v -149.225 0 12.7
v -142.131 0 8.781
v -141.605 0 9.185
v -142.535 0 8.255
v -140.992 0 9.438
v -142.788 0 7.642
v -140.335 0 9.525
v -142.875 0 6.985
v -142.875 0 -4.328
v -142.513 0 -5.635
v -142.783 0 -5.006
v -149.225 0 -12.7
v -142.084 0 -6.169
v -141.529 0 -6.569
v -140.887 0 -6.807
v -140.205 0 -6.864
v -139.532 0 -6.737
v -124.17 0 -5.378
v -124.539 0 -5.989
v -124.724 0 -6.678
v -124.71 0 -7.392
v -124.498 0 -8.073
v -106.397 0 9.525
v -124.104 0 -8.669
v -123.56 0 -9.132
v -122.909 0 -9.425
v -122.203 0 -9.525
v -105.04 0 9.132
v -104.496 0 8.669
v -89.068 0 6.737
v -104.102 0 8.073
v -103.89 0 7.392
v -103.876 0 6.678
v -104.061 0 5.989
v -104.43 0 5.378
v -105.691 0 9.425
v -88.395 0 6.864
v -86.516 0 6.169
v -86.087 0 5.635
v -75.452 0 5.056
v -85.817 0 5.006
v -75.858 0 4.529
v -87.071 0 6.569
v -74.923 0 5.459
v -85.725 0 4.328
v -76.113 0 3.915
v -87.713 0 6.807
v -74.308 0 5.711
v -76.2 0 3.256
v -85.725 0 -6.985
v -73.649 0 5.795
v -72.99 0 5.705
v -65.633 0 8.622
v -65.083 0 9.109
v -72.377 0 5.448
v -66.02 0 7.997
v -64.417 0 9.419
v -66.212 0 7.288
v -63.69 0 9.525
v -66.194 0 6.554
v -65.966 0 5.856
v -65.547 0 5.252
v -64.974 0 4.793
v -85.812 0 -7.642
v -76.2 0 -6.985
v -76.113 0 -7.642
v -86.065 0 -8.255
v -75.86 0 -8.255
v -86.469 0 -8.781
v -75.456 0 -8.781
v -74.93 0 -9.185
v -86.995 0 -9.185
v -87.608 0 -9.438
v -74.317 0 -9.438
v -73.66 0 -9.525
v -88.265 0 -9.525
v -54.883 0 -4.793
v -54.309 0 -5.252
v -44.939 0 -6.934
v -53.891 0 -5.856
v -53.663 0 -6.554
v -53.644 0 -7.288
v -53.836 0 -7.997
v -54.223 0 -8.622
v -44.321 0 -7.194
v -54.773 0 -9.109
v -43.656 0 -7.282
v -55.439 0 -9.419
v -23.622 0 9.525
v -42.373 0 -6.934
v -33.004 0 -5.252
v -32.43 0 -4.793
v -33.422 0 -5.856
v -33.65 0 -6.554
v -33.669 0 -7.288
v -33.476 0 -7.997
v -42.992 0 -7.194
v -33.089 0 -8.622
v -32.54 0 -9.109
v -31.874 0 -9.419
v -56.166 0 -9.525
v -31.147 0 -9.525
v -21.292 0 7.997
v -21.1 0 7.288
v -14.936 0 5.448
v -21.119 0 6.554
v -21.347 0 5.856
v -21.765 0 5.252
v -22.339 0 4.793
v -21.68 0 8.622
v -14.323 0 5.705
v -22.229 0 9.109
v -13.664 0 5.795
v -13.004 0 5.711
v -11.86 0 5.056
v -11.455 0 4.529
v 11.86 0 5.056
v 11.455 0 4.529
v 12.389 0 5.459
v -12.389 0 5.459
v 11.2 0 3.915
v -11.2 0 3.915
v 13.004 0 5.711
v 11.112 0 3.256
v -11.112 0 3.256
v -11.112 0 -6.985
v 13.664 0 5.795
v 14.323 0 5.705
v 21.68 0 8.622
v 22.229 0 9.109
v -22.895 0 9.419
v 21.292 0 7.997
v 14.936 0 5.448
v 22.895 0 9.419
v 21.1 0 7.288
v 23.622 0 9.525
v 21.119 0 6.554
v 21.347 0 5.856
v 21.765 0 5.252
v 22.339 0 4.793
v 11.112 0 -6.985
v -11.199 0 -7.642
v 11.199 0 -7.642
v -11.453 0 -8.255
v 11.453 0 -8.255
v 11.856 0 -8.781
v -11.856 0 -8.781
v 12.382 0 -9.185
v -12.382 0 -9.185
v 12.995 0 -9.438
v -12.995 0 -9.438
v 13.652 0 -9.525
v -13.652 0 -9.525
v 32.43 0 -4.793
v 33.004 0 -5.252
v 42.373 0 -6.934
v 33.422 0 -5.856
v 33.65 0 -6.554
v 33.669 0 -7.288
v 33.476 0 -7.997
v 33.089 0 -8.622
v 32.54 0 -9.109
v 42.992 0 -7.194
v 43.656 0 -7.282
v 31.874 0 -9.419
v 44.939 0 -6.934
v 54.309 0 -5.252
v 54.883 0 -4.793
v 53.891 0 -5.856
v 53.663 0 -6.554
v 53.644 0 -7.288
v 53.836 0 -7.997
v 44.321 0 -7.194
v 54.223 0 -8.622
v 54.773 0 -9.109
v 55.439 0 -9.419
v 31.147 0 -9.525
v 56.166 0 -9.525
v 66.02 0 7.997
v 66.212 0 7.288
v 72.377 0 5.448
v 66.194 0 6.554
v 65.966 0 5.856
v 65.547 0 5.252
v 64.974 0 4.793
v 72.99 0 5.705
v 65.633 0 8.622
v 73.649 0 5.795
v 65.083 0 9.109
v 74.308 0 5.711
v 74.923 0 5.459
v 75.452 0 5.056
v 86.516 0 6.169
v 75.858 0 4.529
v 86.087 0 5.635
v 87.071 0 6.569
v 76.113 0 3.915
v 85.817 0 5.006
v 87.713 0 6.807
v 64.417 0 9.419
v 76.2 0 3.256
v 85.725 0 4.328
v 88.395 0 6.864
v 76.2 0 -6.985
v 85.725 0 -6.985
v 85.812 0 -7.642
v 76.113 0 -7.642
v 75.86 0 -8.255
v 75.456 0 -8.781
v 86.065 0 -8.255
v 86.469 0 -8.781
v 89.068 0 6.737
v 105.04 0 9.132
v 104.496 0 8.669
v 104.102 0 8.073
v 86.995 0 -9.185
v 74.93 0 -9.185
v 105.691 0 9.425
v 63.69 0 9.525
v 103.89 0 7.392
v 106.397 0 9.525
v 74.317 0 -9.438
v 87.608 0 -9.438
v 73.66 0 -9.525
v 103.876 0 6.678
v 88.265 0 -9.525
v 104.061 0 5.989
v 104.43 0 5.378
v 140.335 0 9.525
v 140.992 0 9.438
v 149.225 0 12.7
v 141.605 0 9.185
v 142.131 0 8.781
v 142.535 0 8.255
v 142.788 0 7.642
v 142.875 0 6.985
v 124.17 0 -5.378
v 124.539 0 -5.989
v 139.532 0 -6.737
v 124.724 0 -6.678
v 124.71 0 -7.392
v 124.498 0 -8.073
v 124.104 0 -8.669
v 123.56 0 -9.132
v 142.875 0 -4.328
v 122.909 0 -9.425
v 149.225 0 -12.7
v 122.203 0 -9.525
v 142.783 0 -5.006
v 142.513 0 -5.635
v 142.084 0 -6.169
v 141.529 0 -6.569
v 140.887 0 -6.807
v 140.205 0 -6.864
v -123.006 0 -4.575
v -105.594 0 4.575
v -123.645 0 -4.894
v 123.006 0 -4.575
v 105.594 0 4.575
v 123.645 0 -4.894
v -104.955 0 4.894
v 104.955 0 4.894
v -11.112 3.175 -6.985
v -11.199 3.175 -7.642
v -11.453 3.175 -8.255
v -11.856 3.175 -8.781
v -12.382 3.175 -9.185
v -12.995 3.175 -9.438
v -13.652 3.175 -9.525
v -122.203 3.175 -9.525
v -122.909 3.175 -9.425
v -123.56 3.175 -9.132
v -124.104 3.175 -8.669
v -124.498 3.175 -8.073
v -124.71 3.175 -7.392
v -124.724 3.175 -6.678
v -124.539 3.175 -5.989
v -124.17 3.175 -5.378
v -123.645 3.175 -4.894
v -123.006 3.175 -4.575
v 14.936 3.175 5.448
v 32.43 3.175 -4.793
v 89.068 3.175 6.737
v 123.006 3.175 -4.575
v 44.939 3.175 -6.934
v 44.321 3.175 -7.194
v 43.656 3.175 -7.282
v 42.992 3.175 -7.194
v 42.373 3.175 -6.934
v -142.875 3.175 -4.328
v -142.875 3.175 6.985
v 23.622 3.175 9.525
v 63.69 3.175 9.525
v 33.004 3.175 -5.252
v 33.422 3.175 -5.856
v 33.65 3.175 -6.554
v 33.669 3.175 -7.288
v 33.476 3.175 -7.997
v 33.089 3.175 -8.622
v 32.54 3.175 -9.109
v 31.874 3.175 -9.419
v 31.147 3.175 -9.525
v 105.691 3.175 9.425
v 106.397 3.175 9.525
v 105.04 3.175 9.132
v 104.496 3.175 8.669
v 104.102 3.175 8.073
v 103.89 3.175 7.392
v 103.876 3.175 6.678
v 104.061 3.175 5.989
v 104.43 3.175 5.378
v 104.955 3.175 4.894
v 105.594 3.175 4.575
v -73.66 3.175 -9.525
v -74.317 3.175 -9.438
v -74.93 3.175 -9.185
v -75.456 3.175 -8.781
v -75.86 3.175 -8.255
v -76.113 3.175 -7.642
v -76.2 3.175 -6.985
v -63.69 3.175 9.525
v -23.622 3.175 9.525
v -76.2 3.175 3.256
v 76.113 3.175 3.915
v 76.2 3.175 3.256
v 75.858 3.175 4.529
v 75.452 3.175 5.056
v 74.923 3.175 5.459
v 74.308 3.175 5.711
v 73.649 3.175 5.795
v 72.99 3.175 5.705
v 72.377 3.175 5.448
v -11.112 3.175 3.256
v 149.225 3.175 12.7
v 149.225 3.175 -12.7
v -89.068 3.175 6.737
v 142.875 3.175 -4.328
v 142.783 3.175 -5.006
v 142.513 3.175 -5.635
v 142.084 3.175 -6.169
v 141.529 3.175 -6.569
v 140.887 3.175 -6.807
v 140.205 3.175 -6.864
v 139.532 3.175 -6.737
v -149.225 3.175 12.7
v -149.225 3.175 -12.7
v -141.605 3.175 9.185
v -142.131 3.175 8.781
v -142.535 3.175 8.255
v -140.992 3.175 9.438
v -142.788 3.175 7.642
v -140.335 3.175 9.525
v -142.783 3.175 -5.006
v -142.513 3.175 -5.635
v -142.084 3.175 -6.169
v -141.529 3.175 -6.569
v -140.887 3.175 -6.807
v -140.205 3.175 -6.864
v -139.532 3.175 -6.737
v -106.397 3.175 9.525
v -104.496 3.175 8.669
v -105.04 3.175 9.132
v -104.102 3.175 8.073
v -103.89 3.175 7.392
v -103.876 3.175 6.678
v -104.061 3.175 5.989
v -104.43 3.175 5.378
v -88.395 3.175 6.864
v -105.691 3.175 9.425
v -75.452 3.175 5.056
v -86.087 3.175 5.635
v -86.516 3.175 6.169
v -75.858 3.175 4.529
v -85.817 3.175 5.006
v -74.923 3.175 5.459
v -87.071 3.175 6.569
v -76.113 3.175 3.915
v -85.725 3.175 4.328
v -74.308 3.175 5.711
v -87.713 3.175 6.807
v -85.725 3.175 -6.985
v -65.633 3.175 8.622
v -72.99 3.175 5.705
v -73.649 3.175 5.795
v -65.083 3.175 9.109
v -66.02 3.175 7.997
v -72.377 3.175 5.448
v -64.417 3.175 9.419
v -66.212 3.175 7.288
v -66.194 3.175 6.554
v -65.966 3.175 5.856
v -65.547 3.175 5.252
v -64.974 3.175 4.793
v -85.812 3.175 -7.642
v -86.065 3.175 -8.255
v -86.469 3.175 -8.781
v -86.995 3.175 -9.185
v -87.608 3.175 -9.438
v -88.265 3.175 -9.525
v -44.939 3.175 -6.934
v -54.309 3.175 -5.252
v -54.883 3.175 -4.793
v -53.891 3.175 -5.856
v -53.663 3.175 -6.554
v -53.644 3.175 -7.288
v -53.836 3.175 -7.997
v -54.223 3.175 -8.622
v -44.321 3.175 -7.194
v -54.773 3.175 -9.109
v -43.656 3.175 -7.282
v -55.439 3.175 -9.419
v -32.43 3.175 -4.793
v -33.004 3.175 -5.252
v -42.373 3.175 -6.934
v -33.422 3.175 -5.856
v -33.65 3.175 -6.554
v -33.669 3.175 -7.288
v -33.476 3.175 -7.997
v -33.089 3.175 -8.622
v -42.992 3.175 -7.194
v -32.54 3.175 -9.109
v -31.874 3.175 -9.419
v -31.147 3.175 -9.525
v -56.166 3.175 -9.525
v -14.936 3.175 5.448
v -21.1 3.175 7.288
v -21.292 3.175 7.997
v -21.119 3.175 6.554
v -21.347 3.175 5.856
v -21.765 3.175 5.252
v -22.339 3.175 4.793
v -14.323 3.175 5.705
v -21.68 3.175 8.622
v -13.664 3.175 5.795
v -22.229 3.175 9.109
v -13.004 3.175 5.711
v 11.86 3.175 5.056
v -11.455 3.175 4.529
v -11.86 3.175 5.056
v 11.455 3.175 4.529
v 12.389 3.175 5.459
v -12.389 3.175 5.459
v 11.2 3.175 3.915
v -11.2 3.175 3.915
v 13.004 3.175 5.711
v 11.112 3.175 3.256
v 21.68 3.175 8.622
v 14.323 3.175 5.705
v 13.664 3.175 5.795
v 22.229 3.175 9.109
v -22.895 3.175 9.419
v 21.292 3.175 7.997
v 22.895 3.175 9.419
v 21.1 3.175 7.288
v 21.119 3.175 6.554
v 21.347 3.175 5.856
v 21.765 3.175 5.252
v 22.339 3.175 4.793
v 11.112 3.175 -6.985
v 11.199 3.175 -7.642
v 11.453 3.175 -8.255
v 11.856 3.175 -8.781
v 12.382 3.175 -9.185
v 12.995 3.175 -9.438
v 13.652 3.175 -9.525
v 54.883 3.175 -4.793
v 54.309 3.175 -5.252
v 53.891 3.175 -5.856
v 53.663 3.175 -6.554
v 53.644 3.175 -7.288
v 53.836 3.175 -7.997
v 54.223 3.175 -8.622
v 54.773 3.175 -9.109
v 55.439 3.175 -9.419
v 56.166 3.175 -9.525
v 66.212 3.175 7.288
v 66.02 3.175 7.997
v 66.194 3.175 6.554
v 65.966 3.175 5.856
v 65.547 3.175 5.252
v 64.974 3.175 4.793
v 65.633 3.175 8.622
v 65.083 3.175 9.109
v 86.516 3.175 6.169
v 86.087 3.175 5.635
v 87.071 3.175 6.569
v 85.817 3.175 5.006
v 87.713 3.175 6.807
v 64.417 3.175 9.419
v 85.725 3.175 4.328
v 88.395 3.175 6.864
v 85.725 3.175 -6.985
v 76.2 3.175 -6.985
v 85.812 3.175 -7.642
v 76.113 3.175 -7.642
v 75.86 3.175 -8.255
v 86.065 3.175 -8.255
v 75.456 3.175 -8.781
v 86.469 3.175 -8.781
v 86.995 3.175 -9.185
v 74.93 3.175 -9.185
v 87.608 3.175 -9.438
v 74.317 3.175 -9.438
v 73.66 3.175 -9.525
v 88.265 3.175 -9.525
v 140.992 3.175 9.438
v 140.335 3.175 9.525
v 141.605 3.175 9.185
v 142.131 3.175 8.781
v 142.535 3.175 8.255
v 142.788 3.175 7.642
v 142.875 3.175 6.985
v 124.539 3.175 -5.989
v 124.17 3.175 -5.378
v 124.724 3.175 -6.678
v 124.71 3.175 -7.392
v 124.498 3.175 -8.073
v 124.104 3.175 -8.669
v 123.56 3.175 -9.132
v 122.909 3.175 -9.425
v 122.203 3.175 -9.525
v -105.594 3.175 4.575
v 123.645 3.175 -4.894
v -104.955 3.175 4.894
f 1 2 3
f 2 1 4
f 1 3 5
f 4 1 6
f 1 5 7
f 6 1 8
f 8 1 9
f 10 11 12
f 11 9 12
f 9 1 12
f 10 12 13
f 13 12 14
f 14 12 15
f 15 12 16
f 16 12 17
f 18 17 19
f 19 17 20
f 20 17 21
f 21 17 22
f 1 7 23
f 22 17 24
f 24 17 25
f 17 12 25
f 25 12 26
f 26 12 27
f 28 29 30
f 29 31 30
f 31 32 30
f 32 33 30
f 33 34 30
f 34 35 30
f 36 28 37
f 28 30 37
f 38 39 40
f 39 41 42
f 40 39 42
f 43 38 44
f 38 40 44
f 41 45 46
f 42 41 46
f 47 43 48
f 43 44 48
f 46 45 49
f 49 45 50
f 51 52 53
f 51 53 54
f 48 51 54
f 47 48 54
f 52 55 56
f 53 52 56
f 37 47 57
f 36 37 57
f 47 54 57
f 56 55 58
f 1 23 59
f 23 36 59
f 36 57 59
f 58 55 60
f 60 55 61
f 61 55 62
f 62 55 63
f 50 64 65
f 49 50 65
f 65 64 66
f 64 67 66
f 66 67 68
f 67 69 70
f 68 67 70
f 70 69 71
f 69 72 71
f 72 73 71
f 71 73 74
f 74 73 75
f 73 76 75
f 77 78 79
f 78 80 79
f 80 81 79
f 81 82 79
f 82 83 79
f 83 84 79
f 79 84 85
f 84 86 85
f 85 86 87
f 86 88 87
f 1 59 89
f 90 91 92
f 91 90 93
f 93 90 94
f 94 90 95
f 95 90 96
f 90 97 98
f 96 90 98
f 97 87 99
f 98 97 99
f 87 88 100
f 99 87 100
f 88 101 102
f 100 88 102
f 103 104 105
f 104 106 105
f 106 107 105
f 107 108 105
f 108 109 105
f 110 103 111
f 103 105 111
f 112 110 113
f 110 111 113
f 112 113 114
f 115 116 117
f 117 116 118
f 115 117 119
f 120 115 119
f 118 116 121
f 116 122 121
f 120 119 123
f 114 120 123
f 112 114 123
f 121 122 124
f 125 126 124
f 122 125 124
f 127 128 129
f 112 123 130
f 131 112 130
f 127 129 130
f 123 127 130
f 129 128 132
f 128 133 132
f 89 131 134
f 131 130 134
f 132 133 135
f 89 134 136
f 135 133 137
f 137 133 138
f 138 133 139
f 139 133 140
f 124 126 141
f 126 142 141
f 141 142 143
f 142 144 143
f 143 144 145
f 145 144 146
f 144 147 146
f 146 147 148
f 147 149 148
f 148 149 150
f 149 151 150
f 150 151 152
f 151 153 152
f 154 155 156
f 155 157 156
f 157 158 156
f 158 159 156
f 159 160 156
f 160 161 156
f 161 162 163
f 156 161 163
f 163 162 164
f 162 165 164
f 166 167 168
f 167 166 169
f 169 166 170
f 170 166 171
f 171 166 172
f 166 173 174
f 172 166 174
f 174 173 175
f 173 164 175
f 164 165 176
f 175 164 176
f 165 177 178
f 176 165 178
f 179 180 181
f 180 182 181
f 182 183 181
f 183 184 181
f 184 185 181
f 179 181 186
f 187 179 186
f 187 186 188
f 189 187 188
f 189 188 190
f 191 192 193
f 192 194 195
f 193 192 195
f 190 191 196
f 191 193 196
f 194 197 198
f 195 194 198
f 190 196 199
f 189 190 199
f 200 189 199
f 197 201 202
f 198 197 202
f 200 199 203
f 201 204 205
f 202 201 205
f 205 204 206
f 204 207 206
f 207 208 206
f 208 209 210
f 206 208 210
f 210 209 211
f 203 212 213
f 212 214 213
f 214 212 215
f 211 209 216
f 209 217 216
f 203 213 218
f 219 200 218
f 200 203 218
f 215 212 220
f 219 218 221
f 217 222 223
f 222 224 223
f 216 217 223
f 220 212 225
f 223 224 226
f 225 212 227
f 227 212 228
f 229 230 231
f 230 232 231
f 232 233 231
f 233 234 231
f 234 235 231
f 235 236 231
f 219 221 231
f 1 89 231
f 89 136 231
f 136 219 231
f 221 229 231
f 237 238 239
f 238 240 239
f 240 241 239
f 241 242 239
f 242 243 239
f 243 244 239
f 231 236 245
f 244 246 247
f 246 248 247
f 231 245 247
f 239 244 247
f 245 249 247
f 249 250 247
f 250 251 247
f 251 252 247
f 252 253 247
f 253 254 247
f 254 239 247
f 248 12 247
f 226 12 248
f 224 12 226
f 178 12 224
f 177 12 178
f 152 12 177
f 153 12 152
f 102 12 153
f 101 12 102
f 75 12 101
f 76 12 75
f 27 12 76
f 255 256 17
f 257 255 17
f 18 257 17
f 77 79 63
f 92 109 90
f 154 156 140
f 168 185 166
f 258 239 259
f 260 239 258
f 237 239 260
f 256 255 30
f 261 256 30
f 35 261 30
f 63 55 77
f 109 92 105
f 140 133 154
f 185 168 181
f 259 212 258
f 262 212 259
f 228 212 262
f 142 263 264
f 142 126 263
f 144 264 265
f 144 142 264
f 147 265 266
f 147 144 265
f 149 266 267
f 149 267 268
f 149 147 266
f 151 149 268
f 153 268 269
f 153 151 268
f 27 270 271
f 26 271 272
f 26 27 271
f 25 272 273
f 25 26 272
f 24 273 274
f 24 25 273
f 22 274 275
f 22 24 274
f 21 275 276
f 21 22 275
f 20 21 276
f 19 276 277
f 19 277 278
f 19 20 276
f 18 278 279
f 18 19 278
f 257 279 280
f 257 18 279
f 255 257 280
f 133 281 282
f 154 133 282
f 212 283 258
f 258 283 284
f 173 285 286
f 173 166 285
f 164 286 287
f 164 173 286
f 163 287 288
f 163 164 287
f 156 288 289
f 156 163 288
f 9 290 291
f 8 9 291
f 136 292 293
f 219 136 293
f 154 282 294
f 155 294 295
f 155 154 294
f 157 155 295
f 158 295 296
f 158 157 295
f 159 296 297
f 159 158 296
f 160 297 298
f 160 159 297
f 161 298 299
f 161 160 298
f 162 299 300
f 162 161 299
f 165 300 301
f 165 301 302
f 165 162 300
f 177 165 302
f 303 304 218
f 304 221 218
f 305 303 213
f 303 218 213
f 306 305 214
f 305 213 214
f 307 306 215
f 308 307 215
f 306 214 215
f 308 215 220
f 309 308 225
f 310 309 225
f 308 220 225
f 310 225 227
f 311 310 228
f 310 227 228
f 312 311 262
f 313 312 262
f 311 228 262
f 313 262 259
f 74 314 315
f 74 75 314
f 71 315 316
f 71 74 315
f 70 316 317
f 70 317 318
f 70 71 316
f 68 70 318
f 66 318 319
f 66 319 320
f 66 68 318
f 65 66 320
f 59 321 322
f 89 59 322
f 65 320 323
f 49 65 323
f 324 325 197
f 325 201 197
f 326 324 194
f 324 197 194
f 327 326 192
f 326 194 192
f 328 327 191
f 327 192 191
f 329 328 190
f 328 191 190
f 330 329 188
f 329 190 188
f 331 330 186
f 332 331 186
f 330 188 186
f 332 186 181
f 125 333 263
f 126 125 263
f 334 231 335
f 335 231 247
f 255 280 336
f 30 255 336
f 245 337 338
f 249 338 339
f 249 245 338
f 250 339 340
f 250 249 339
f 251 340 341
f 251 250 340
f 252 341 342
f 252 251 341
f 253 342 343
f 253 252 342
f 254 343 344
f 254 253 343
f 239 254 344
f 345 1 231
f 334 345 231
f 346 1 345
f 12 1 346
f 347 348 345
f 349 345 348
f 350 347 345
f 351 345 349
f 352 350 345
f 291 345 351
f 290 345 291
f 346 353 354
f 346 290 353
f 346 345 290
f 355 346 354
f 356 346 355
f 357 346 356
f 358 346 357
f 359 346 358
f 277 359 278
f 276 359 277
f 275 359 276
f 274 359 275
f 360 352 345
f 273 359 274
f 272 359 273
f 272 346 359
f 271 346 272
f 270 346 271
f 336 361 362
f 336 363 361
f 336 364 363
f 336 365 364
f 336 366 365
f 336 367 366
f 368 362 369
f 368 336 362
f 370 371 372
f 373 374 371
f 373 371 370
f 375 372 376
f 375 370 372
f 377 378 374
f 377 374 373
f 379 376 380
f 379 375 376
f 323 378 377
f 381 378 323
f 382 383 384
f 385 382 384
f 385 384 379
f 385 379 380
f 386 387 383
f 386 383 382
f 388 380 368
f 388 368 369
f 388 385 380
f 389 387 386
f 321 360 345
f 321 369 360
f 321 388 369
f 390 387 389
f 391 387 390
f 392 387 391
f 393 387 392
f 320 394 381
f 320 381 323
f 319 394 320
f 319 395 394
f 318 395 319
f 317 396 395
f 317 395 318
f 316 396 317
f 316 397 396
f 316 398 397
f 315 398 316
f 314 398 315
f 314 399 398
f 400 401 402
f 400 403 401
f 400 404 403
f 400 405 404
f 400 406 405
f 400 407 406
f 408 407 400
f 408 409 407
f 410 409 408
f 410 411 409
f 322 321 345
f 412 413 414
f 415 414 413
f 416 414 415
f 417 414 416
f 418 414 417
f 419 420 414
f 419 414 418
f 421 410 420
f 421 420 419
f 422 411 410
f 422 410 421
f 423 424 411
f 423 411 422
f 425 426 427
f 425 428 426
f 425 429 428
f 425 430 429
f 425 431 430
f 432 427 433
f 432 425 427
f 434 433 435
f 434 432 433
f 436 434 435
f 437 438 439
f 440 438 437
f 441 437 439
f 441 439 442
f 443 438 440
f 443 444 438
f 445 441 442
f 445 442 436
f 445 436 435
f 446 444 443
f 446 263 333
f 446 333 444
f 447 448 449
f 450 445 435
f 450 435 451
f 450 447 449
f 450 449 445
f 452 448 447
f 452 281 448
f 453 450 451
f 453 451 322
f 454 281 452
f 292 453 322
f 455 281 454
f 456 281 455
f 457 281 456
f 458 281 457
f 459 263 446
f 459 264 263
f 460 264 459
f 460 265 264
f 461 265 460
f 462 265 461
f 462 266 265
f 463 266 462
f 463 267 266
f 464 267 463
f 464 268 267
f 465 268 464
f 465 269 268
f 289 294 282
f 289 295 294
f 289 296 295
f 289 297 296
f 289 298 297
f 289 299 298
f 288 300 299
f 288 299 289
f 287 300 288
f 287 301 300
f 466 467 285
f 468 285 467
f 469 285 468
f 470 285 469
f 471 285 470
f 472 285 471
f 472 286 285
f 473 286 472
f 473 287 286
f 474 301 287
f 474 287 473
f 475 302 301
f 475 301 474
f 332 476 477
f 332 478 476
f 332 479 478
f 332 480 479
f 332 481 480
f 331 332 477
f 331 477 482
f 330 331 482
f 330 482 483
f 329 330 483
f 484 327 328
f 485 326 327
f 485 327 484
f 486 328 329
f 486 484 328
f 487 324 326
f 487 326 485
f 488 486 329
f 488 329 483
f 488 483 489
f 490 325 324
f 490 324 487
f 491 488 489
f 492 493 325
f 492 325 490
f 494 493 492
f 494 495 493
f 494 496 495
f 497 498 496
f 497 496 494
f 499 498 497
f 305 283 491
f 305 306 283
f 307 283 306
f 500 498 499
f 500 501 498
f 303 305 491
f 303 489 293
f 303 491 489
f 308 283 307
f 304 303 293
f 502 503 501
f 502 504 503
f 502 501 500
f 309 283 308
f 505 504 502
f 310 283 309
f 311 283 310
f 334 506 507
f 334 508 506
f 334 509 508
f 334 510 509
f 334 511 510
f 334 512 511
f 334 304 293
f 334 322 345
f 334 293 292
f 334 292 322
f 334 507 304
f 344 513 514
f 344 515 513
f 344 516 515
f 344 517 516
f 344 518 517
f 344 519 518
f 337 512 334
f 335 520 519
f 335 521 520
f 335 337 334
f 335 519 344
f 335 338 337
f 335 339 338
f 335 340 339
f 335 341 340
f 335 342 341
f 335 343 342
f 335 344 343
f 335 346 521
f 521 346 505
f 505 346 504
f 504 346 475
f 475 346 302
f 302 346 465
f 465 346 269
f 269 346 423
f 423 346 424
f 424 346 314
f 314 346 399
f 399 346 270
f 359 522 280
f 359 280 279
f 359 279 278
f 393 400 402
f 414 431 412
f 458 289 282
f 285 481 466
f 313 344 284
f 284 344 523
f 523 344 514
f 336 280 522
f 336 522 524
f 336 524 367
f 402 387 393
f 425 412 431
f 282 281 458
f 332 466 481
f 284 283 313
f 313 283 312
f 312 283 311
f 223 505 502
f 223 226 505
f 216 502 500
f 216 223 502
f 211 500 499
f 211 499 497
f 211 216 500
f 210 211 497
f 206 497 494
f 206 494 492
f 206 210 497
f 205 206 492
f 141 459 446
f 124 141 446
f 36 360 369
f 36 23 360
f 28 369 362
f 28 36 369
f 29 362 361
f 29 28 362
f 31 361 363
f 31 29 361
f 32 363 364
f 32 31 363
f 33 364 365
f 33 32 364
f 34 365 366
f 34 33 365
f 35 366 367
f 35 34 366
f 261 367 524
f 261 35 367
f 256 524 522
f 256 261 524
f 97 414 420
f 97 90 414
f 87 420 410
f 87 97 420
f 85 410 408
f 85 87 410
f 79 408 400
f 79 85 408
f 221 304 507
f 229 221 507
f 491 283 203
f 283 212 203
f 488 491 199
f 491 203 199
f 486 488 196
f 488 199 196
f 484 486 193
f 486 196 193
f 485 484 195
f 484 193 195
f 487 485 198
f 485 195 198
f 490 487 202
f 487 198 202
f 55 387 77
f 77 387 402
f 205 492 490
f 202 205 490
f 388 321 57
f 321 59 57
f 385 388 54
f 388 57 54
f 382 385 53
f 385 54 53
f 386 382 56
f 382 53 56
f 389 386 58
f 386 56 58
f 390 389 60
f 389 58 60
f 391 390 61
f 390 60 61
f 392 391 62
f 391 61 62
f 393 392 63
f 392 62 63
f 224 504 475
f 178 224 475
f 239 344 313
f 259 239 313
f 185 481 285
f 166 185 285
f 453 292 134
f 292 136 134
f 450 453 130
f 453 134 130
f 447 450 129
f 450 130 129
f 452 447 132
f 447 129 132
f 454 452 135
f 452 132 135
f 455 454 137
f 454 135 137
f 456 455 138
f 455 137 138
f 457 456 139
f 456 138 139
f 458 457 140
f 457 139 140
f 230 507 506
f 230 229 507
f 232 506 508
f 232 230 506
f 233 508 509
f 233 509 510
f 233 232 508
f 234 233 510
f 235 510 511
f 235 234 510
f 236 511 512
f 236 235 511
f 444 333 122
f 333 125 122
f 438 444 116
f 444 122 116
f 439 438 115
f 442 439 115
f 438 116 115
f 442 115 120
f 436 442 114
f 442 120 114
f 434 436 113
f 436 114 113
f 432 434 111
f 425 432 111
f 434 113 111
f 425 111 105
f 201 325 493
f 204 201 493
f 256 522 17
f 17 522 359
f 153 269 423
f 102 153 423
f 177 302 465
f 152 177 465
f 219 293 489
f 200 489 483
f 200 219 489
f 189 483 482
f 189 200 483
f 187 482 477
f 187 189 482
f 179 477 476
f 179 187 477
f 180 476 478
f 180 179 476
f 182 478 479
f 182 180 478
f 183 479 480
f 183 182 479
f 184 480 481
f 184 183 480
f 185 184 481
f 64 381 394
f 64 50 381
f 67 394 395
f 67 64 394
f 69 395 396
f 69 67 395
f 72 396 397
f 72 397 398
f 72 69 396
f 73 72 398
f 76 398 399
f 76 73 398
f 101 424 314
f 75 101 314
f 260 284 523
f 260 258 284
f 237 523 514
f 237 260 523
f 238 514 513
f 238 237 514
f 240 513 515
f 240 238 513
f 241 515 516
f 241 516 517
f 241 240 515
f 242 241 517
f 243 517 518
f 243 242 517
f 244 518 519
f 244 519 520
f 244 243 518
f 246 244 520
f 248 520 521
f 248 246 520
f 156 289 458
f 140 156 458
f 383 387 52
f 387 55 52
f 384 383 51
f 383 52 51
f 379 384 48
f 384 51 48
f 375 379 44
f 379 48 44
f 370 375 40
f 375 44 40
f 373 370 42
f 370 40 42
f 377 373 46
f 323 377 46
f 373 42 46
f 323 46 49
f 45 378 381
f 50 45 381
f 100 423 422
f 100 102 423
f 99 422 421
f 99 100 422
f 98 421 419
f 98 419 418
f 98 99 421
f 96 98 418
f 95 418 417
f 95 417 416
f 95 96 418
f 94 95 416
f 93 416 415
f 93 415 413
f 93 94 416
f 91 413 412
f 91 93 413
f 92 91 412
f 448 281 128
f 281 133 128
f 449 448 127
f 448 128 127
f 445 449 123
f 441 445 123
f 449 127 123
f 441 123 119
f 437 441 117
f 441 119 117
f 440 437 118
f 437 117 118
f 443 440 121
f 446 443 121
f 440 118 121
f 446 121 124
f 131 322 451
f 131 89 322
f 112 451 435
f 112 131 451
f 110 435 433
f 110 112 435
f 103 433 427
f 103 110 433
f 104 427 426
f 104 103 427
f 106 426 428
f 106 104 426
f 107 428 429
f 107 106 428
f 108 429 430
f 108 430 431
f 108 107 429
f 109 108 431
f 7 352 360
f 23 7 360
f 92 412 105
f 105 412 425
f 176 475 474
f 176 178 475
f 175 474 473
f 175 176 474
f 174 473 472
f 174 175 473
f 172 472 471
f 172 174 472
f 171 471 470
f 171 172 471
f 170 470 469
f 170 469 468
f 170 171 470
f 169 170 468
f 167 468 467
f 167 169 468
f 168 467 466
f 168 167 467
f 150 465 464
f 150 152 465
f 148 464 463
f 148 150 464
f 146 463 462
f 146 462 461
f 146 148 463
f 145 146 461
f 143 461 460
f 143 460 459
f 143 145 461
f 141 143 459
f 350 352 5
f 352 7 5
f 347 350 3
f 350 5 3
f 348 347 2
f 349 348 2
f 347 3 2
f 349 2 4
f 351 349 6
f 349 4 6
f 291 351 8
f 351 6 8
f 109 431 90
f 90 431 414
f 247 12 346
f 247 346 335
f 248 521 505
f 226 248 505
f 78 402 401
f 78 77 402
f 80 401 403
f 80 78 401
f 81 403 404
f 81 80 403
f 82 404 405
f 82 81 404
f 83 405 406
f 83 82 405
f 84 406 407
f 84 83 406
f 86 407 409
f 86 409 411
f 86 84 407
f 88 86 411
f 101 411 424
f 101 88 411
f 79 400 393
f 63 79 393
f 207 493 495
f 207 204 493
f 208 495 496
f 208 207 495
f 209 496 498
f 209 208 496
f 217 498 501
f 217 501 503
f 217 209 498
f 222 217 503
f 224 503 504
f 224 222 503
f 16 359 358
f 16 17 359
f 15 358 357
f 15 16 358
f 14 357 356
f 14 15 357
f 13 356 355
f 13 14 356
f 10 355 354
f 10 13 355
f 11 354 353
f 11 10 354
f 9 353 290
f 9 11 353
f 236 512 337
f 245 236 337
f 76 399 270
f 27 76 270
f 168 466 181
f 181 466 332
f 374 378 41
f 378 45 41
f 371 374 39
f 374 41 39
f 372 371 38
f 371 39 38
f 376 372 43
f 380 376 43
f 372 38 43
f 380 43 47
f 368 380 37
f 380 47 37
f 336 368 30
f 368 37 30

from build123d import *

# Parameters (mm, degrees)
SKETCH1_W           = 298.45
SKETCH1_H           = 25.4
BOSS_EXTRUDE1_DEPTH = 3.175
CUT_EXTRUDE1_DEPTH  = 4.175
FILLET1_R           = 2.54


with BuildPart() as part:
    # Sketch1 → Boss-Extrude1 (new body)
    with BuildSketch(Plane(origin=(0, 0, 0), x_dir=(1, 0, 0), z_dir=(0, 1, 0))):
        Rectangle(SKETCH1_W, SKETCH1_H)
    extrude(amount=BOSS_EXTRUDE1_DEPTH)

    # Sketch2 → Cut-Extrude1 (cut, through all)
    with BuildSketch(Plane(origin=(0, 3.175, 0), x_dir=(1, 0, 0), z_dir=(0, 1, 0))):
        Polygon((-142.875, -9.525), (-90.745115786, -9.525), (-142.875, 7.851628071), align=None)
        Polygon((-85.725, -7.851628071), (-85.725, 9.525), (-137.854884214, 9.525), align=None)
        Polygon((-76.2, -7.685517516), (-46.798699244, 9.525), (-76.2, 9.525), align=None)
        Polygon((-73.057550756, -9.525), (-14.254949244, -9.525), (-43.65625, 7.685517516), align=None)
        Polygon((-11.1125, -7.685517516), (-11.1125, 9.525), (-40.513800756, 9.525), align=None)
        Polygon((11.1125, -7.685517516), (40.513800756, 9.525), (11.1125, 9.525), align=None)
        Polygon((14.254949244, -9.525), (73.057550756, -9.525), (43.65625, 7.685517516), align=None)
        Polygon((76.2, -7.685517516), (76.2, 9.525), (46.798699244, 9.525), align=None)
        Polygon((85.725, -7.851628071), (137.854884214, 9.525), (85.725, 9.525), align=None)
        Polygon((90.745115786, -9.525), (142.875, -9.525), (142.875, 7.851628071), align=None)
    extrude(amount=-CUT_EXTRUDE1_DEPTH, mode=Mode.SUBTRACT)

    # Fillet1
    fillet1_edges = [part.edges().sort_by_distance(p)[0] for p in [
        (-43.65625, 1.5875, -7.685517516),
        (-14.254949244, 1.5875, 9.525),
        (-73.057550756, 1.5875, 9.525),
        (-40.513800756, 1.5875, -9.525),
        (-11.1125, 1.5875, -9.525),
        (-11.1125, 1.5875, 7.685517516),
        (-76.2, 1.5875, 7.685517516),
        (-76.2, 1.5875, -9.525),
        (-46.798699244, 1.5875, -9.525),
        (-85.725, 1.5875, 7.851628071),
        (-137.854884214, 1.5875, -9.525),
        (-85.725, 1.5875, -9.525),
        (85.725, 1.5875, 7.851628071),
        (85.725, 1.5875, -9.525),
        (137.854884214, 1.5875, -9.525),
        (46.798699244, 1.5875, -9.525),
        (76.2, 1.5875, -9.525),
        (76.2, 1.5875, 7.685517516),
        (11.1125, 1.5875, 7.685517516),
        (11.1125, 1.5875, -9.525),
        (40.513800756, 1.5875, -9.525),
        (43.65625, 1.5875, -7.685517516),
        (73.057550756, 1.5875, 9.525),
        (14.254949244, 1.5875, 9.525),
        (90.745115786, 1.5875, 9.525),
        (142.875, 1.5875, -7.851628071),
        (142.875, 1.5875, 9.525),
        (-90.745115786, 1.5875, 9.525),
        (-142.875, 1.5875, 9.525),
        (-142.875, 1.5875, -7.851628071),
    ]]
    fillet(fillet1_edges, radius=FILLET1_R)


solid = part.part
